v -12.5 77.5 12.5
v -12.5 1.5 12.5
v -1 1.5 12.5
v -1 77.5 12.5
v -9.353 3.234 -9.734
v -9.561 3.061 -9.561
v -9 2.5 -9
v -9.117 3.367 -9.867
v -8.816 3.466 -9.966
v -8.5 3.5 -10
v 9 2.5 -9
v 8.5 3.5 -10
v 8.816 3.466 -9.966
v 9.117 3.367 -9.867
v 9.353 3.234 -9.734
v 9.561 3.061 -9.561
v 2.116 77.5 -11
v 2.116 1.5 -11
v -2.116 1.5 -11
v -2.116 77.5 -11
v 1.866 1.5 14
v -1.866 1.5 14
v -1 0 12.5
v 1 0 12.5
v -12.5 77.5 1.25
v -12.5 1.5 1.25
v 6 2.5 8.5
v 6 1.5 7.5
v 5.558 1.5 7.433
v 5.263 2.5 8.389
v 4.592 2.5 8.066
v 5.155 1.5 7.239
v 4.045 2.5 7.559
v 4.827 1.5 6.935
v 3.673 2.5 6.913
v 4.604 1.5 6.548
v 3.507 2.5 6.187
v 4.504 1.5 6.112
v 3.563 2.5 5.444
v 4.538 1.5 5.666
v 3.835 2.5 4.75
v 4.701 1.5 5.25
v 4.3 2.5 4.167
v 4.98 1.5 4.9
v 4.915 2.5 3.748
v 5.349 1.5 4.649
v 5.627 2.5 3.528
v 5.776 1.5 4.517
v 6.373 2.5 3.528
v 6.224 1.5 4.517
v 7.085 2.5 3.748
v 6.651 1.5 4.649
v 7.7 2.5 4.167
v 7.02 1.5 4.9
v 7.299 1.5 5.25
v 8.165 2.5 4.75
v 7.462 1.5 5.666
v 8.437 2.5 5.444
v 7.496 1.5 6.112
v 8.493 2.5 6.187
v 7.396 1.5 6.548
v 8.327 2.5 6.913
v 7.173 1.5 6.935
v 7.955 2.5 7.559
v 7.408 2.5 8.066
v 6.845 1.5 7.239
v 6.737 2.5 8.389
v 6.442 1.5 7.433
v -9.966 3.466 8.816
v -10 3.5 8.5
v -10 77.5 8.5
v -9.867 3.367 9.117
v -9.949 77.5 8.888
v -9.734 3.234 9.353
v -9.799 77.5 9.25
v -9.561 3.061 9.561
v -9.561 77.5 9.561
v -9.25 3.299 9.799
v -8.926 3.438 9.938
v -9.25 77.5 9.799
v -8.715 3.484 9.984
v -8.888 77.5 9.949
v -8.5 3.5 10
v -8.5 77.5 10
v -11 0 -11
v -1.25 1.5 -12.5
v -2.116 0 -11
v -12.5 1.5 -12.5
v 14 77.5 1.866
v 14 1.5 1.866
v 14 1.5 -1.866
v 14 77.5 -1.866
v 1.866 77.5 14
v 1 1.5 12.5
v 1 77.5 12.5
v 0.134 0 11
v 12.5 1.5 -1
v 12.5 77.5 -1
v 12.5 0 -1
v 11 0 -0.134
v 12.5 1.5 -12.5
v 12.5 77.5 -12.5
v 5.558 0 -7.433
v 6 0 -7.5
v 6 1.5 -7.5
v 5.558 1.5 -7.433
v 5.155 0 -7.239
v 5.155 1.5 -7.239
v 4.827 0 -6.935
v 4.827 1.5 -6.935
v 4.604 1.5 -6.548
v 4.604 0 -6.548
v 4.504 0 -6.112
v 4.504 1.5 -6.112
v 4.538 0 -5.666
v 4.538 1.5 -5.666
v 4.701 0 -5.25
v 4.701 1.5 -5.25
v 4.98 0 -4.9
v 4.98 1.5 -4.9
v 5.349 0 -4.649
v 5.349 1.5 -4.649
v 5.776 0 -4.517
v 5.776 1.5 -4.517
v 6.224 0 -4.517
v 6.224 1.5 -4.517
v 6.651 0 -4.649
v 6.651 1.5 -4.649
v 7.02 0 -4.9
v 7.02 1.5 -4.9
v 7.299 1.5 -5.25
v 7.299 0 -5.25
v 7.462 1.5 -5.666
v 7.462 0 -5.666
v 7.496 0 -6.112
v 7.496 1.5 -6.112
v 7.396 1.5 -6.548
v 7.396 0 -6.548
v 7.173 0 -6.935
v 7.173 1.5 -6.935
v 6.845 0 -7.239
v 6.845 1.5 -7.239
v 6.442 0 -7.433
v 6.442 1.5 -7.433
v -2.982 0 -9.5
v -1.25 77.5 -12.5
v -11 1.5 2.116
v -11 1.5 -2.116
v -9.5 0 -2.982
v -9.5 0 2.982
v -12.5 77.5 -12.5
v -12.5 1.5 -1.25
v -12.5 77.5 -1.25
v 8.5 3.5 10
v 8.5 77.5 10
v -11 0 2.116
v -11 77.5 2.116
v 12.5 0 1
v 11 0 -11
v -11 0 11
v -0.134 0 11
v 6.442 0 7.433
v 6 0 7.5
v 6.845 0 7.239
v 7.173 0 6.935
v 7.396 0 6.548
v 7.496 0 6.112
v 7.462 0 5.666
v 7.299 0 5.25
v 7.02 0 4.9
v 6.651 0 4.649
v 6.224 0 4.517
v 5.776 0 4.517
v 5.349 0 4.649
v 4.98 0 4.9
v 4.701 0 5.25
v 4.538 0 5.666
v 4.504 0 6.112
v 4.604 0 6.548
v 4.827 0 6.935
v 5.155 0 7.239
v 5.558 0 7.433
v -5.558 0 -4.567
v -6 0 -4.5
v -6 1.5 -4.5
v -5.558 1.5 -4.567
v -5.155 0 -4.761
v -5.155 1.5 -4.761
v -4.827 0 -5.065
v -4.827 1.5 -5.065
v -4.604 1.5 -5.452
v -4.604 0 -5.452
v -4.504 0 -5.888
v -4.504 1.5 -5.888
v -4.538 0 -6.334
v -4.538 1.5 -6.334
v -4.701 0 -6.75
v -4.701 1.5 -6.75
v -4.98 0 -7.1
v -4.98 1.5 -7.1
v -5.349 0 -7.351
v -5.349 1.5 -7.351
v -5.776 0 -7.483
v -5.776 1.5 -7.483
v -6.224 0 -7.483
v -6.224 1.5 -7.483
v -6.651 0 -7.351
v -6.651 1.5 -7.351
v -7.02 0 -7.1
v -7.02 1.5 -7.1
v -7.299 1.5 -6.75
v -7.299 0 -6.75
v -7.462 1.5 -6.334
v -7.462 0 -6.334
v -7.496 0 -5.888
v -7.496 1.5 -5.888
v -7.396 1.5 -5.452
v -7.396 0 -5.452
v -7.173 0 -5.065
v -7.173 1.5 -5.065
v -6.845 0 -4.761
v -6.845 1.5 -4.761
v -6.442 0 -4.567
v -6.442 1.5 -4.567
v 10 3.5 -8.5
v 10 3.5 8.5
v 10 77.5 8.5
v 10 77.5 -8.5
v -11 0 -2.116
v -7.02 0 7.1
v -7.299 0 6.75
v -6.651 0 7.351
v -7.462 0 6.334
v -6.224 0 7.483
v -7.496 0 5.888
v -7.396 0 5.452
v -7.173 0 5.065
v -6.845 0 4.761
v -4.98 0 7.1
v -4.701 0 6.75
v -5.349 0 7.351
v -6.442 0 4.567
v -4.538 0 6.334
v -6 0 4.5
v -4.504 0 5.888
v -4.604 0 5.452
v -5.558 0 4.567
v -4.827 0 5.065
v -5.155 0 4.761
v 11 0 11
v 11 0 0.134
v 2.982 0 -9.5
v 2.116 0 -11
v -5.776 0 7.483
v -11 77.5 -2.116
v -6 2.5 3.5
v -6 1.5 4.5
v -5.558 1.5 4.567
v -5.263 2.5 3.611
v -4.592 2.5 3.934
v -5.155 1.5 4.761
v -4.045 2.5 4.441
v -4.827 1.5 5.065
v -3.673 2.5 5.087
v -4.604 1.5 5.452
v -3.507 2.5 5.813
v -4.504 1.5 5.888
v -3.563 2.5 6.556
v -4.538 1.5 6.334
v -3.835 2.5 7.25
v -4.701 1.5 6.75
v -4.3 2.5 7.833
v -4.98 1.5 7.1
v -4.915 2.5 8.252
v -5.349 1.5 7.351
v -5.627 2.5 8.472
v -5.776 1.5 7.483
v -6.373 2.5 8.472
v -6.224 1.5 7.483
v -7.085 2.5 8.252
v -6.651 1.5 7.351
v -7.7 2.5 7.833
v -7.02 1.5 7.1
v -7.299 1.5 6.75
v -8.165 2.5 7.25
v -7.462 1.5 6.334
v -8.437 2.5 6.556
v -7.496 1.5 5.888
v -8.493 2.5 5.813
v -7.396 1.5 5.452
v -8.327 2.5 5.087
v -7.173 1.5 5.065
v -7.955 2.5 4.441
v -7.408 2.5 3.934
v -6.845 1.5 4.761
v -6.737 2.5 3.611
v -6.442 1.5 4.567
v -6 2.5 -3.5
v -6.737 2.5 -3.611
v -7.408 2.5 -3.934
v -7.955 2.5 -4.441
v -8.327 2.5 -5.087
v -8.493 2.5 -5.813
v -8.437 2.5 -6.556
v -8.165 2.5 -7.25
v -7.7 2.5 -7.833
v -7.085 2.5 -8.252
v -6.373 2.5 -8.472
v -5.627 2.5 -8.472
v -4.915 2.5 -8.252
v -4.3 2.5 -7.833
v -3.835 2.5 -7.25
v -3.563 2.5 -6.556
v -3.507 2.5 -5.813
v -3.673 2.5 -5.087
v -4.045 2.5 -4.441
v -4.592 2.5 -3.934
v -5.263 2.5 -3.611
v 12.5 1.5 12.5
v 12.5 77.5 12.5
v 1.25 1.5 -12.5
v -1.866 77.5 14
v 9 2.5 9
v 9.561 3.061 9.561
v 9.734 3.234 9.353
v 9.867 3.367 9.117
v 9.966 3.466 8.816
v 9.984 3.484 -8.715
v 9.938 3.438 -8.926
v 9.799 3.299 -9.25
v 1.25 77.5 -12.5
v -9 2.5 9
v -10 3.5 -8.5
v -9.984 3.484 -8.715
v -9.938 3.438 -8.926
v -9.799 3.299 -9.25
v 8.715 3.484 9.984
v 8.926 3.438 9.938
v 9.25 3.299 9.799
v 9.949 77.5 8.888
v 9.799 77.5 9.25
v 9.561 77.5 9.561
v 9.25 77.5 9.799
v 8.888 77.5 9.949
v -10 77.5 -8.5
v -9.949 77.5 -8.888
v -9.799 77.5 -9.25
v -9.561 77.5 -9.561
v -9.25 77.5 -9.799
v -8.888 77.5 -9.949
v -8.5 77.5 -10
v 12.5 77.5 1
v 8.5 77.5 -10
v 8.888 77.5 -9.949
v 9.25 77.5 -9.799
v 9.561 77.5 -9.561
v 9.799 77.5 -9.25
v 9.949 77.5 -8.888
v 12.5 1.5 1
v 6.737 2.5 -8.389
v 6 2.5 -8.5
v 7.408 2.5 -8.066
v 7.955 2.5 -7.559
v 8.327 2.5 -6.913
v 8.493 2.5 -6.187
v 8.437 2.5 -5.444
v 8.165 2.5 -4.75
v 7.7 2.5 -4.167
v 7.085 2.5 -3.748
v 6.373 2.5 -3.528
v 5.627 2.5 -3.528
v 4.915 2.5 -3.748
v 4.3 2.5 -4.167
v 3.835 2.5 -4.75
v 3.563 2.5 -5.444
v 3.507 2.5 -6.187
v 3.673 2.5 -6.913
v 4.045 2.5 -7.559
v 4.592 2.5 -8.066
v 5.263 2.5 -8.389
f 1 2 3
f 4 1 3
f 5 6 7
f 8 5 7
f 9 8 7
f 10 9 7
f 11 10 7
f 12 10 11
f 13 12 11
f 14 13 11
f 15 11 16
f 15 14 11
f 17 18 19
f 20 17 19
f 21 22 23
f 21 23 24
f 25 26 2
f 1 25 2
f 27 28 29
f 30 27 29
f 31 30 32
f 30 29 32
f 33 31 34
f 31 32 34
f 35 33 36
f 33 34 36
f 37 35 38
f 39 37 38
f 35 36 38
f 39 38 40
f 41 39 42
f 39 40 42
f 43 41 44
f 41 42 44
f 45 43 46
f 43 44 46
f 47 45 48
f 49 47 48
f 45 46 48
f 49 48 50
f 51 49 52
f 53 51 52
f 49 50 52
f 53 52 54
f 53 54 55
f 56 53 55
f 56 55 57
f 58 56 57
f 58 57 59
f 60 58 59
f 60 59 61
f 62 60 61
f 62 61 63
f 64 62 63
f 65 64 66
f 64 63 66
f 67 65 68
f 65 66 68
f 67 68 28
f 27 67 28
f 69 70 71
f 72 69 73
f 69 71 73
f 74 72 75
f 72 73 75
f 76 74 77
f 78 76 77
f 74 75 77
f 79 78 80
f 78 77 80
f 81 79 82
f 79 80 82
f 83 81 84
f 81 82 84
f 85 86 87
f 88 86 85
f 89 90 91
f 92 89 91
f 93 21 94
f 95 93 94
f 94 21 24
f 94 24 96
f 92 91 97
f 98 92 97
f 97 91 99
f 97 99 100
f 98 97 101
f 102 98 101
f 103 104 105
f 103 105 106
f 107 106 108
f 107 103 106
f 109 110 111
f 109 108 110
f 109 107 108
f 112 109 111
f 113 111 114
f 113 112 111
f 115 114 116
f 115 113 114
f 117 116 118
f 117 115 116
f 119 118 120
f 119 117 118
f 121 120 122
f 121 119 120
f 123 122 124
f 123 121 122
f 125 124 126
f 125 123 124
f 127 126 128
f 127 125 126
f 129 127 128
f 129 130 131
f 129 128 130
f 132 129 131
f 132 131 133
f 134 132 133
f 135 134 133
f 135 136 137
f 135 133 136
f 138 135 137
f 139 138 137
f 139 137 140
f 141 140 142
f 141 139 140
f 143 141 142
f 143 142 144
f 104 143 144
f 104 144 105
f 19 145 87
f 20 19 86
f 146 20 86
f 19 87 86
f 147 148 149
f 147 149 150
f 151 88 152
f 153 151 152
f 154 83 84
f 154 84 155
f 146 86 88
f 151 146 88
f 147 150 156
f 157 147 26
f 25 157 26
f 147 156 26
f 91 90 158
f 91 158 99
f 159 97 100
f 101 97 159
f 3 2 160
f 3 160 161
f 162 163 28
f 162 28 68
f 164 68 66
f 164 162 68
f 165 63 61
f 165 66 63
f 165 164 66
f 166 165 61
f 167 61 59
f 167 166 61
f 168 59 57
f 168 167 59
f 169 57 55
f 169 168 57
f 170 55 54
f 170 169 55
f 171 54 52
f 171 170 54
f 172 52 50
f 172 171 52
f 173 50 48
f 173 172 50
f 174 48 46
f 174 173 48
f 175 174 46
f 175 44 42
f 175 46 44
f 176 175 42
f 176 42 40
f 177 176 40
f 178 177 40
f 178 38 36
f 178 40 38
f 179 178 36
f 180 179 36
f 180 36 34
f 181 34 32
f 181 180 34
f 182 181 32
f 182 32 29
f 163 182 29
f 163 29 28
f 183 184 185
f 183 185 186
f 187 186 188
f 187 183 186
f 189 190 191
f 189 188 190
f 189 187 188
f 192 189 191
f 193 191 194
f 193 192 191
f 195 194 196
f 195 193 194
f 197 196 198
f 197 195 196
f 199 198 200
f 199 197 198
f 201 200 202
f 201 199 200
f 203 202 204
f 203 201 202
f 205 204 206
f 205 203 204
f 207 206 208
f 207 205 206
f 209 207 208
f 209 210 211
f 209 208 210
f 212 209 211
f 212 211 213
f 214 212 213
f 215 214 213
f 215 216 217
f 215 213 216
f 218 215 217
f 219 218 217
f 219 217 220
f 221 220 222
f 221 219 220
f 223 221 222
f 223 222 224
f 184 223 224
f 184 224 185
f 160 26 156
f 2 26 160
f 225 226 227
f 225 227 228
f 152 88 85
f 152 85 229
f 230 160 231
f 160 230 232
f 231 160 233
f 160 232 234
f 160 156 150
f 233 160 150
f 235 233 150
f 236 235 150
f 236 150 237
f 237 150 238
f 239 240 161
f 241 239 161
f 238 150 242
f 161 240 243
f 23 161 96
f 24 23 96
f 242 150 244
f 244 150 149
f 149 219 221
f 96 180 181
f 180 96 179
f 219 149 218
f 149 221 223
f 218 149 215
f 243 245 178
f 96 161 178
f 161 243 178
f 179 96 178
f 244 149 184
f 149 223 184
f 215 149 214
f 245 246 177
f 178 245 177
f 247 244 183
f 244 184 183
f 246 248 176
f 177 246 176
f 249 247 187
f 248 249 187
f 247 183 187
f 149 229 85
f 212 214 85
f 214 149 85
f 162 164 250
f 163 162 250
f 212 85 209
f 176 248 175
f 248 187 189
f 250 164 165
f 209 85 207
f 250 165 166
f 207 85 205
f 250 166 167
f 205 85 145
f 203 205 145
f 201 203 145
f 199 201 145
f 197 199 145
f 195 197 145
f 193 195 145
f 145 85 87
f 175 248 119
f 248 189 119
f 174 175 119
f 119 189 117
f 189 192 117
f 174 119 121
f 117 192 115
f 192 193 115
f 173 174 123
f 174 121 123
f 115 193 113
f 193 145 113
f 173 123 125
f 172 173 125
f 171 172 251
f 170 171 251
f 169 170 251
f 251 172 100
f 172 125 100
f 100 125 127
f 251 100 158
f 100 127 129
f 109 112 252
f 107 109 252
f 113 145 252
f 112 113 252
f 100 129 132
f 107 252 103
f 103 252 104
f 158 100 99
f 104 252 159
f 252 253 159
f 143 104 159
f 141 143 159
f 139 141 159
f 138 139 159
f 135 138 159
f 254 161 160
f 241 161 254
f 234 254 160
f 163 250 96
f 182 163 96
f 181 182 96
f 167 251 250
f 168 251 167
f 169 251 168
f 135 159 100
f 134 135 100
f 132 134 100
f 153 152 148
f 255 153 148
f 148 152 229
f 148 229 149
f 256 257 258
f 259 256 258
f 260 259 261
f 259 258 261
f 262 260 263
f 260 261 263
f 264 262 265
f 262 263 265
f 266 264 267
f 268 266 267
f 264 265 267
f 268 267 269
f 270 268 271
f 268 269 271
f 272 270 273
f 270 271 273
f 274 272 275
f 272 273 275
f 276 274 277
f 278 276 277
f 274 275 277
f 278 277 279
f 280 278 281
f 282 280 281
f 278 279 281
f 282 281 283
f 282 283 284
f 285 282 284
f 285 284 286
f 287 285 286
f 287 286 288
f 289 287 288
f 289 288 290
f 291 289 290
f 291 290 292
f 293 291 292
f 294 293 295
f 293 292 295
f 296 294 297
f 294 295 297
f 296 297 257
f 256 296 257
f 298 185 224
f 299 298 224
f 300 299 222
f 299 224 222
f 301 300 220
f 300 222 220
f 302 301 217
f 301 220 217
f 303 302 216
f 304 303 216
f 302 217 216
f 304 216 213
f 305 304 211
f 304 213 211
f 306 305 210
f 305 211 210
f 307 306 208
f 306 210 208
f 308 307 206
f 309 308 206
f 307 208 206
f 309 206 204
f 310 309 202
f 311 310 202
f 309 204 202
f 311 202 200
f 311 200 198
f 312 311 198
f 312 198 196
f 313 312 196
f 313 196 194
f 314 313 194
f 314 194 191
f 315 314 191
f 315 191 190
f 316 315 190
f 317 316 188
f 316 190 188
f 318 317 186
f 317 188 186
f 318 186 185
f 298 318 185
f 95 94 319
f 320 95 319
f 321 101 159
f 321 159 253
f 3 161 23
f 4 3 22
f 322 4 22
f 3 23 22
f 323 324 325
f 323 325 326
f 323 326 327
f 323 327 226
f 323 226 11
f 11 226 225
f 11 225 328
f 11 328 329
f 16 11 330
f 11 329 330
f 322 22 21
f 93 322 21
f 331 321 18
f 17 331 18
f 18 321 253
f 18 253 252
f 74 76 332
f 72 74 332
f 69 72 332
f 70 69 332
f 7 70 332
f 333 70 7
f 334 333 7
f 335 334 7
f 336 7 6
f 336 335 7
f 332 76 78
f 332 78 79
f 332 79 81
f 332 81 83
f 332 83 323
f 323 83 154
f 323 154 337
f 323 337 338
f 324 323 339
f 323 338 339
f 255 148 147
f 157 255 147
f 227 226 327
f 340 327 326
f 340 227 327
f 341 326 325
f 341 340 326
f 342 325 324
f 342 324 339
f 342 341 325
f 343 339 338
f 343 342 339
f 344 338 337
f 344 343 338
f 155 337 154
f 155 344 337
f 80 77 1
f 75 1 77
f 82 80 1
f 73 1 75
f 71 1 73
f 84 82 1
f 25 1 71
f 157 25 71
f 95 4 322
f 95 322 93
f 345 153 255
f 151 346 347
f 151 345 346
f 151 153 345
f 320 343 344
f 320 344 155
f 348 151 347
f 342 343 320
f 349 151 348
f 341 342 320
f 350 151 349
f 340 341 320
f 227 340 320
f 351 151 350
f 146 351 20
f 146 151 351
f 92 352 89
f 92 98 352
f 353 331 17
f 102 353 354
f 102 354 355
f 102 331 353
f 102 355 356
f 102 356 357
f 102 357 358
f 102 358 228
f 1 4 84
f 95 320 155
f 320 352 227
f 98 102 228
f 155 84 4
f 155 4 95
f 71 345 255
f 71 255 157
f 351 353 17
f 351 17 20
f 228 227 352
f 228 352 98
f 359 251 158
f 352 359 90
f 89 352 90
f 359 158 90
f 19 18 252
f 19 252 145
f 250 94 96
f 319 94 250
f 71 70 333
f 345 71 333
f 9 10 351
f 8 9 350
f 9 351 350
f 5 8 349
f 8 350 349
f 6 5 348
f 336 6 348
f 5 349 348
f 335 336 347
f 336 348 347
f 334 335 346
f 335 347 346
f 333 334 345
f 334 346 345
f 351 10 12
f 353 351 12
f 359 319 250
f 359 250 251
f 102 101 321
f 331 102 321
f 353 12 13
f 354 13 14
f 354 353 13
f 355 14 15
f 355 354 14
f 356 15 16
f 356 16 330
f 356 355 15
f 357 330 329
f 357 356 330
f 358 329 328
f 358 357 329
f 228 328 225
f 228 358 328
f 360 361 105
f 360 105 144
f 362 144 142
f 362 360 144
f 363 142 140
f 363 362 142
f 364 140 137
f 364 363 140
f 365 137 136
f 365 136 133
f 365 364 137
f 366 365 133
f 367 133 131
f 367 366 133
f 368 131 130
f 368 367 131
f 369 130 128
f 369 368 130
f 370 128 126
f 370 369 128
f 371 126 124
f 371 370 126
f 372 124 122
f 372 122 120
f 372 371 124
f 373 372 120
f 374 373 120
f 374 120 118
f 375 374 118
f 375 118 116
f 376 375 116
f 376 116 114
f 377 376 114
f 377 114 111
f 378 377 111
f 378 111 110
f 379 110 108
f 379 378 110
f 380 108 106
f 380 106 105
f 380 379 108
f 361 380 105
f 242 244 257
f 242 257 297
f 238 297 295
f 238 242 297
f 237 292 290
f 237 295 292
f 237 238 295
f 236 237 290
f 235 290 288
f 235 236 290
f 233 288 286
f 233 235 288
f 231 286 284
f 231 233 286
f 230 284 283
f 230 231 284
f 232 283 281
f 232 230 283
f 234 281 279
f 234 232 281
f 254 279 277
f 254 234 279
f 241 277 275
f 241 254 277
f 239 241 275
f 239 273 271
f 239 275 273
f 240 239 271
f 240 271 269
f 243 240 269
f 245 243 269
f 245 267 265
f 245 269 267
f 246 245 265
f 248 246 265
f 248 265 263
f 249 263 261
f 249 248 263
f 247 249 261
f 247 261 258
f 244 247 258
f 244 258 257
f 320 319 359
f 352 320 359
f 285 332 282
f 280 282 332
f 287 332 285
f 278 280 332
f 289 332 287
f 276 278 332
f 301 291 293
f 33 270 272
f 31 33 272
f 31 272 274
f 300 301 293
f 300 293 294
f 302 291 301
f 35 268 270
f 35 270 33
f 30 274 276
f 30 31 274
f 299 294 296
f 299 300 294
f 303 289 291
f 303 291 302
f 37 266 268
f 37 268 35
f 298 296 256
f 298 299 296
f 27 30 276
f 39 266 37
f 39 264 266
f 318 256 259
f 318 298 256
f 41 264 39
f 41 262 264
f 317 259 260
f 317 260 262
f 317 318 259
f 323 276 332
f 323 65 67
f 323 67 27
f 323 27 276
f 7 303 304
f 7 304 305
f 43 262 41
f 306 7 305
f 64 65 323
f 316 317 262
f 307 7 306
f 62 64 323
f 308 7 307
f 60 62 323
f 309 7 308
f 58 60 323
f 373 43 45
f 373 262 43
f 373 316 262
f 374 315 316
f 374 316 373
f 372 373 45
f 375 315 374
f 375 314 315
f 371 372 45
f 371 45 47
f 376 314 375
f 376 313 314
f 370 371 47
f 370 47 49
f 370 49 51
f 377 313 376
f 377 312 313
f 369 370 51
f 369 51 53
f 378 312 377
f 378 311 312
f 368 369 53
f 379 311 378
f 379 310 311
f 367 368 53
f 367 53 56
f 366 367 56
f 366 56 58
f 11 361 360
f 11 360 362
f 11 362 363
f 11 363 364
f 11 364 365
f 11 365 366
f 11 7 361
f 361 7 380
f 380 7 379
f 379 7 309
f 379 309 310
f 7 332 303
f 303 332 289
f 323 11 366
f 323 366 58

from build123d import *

# Parameters (mm, degrees)
SKETCH1_W               = 20
SKETCH1_H               = 20
BOSS_EXTRUDE1_DEPTH     = 77.5
SKETCH2_W               = 20
SKETCH2_H               = 20
BOSS_EXTRUDE2_DEPTH     = 2.5
CUT_EXTRUDE1_DEPTH      = 78.569323834
CUT_EXTRUDE1_DEPTH_BACK = 78.569323834
SKETCH3_R               = 1.5
CHAMFER1_SIZE           = 1.5
CHAMFER2_SIZE           = 1
FILLET1_R               = 1.5


with BuildPart() as part:
    # Sketch1 → Boss-Extrude1 (new body)
    with BuildSketch(Plane(origin=(0, 0, 0), x_dir=(1, 0, 0), z_dir=(0, 1, 0))):
        Polygon((-11, 2.116025404), (-11, -2.116025404), (-12.5, -1.25), (-12.5, -12.5), (-1, -12.5), (-1.866025404, -14), (1.866025404, -14), (1, -12.5), (12.5, -12.5), (12.5, -1), (14, -1.866025404), (14, 1.866025404), (12.5, 1), (12.5, 12.5), (1.25, 12.5), (2.116025404, 11), (-2.116025404, 11), (-1.25, 12.5), (-12.5, 12.5), (-12.5, 1.25), align=None)
        Rectangle(SKETCH1_W, SKETCH1_H, mode=Mode.SUBTRACT)
    extrude(amount=BOSS_EXTRUDE1_DEPTH)

    # Sketch2 → Boss-Extrude2 (add)
    with BuildSketch(Plane(origin=(0, 0, 0), x_dir=(1, 0, 0), z_dir=(0, 1, 0))):
        Rectangle(SKETCH2_W, SKETCH2_H)
    extrude(amount=BOSS_EXTRUDE2_DEPTH)

    # Sketch3 → Cut-Extrude1 (cut, two sides: drawn at the far end of the back side and taken through both)
    with BuildSketch(Plane(origin=(0, 2.5, 0), x_dir=(1, 0, 0), z_dir=(0, 1, 0)).offset(-CUT_EXTRUDE1_DEPTH_BACK)):
        with Locations(Location((-6, 6, 0), (0, 0, 270))):
            Circle(SKETCH3_R)
        with Locations(Location((6, 6, 0), (0, 0, 90))):
            Circle(SKETCH3_R)
        with Locations(Location((6, -6, 0), (0, 0, 270))):
            Circle(SKETCH3_R)
        with Locations(Location((-6, -6, 0), (0, 0, 90))):
            Circle(SKETCH3_R)
    extrude(amount=CUT_EXTRUDE1_DEPTH + CUT_EXTRUDE1_DEPTH_BACK, mode=Mode.SUBTRACT)

    # Chamfer1
    chamfer1_edges = [part.edges().sort_by_distance(p)[0] for p in [
        (14, 0, 0),
        (12.5, 0, -6.75),
        (6.875, 0, -12.5),
        (0, 0, -11),
        (0, 0, 14),
        (12.5, 0, 6.75),
        (6.75, 0, 12.5),
        (-11, 0, 0),
        (-6.75, 0, 12.5),
        (-12.5, 0, 6.875),
        (-6.875, 0, -12.5),
        (-12.5, 0, -6.875),
    ]]
    chamfer(chamfer1_edges, length=CHAMFER1_SIZE - 0.0001)  # a hair under: the kernel refuses the full size

    # Chamfer2
    chamfer2_edges = [part.edges().sort_by_distance(p)[0] for p in [
        (0, 2.5, -10),
        (-10, 2.5, 0),
        (0, 2.5, 10),
        (10, 2.5, 0),
        (-6, 2.5, 7.5),
        (6, 2.5, 4.5),
        (6, 2.5, -4.5),
        (-6, 2.5, -7.5),
    ]]
    chamfer(chamfer2_edges, length=CHAMFER2_SIZE)

    # Fillet1
    fillet1_edges = [part.edges().sort_by_distance(p)[0] for p in [
        (10, 40.5, -10),
        (-10, 40.5, -10),
        (-10, 40.5, 10),
        (10, 40.5, 10),
    ]]
    fillet(fillet1_edges, radius=FILLET1_R)


solid = part.part
